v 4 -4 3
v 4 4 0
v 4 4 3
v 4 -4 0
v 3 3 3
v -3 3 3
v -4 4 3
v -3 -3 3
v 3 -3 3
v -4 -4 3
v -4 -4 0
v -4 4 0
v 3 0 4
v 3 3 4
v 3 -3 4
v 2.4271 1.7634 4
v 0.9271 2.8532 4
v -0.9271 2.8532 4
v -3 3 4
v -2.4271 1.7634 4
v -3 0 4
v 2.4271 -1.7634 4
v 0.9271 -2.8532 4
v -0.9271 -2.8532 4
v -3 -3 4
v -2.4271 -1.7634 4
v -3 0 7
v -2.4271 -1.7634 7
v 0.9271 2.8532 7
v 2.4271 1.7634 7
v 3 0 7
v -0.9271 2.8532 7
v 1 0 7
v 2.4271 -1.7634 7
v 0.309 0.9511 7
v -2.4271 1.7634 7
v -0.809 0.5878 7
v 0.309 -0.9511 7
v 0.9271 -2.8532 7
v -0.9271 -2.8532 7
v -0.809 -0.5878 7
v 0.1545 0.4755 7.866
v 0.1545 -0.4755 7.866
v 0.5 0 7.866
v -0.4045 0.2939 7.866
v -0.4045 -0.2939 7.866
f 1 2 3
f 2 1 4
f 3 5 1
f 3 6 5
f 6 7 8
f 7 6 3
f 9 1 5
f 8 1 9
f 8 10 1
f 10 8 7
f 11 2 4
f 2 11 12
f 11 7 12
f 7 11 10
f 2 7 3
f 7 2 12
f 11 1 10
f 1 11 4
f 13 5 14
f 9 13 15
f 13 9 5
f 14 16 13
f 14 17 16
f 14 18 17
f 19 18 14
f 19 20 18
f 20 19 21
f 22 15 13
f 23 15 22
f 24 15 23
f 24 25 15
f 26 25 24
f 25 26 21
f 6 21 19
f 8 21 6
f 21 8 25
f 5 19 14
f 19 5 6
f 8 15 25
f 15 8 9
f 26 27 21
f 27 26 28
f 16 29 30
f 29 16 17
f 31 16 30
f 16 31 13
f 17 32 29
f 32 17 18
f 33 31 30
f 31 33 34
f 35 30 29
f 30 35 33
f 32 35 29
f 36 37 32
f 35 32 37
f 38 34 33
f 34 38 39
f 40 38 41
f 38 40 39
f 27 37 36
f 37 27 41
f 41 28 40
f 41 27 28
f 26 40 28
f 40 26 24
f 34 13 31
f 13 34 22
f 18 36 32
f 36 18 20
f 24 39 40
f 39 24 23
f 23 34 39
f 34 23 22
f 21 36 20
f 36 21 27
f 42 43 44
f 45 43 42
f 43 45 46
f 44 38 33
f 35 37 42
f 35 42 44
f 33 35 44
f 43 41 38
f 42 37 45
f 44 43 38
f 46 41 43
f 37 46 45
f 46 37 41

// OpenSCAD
union() {
    translate ([-4, -4, 0])
        cube([8, 8, 3]);
    translate ([-3, -3, 3])
        cube([6, 6, 1]);
    translate([0, 0, 4])
        cylinder(h=3, r1=3, r2=3);
    translate([0, 0, 7])
        sphere(1);
}
